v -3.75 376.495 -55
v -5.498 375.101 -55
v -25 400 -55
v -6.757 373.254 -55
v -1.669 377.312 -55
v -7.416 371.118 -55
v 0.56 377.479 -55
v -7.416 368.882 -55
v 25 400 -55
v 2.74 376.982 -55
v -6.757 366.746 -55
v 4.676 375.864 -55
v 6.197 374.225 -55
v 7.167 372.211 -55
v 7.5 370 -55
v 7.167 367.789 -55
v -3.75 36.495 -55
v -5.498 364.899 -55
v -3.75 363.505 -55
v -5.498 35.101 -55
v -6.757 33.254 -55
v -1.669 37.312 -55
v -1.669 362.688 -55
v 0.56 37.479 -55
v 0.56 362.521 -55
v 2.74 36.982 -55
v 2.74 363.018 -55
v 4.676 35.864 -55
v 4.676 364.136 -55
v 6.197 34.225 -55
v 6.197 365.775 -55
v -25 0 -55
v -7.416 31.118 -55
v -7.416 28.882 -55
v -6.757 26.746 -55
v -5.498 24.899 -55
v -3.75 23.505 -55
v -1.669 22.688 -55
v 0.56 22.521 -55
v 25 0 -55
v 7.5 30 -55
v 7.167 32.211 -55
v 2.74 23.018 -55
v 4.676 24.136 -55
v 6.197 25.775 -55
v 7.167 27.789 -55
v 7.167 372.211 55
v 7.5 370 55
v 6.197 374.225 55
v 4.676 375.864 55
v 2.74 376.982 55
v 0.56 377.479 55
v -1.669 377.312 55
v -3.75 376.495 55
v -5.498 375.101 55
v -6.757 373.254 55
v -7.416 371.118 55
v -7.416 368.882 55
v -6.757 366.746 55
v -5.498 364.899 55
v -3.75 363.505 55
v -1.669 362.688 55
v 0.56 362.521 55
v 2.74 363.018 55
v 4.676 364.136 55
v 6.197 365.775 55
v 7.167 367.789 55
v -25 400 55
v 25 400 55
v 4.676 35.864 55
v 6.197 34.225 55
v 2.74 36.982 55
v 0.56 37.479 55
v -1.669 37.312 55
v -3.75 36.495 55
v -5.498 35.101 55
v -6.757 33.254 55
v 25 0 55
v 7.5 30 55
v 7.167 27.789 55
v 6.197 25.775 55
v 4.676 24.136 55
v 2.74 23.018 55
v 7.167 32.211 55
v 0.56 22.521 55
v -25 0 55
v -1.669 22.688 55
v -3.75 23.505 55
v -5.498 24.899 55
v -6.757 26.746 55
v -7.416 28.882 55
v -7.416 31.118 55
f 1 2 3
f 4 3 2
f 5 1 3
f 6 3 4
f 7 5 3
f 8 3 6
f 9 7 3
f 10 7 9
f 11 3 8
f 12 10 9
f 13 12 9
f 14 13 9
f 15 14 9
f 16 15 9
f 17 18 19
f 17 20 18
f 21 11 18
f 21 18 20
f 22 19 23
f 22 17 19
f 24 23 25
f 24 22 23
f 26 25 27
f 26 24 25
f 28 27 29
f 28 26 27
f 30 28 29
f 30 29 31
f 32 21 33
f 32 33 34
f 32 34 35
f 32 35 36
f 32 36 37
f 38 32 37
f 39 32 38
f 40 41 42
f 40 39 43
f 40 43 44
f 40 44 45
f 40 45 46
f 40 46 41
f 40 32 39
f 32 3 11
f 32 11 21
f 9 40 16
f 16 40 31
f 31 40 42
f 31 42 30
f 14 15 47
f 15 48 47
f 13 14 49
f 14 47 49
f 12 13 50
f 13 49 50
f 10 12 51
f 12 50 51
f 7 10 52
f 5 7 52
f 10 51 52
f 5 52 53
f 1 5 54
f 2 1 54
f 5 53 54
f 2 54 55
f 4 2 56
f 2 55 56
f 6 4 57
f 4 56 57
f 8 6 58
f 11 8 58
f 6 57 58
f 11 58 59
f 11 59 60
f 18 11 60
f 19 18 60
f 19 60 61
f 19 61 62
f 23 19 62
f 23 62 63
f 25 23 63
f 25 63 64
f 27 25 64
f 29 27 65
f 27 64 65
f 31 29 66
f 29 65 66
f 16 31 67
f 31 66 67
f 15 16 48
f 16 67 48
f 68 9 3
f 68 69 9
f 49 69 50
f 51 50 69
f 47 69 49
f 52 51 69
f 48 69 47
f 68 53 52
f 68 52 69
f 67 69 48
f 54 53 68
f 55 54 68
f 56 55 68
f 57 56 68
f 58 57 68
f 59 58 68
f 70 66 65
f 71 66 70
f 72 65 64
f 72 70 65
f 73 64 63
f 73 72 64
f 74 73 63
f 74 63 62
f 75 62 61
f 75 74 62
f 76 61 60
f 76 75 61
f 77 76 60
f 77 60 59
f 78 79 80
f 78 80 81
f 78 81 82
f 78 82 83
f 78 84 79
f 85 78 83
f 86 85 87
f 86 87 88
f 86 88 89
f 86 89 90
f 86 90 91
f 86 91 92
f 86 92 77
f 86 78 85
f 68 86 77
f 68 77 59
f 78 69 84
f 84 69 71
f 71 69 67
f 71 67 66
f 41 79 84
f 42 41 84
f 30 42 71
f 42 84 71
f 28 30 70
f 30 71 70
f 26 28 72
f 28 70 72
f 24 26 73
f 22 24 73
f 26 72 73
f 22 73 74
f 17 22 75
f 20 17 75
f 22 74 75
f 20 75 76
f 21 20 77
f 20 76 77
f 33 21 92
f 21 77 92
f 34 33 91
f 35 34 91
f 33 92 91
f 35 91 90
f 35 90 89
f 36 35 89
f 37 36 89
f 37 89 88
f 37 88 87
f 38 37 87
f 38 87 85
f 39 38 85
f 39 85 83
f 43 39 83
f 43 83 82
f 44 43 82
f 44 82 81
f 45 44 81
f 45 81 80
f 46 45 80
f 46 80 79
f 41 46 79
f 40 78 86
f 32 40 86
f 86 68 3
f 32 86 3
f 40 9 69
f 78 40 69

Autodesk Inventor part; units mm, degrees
ref_plane "YZ Plane" through (0, 0, 0) normal (1, 0, 0) x (0, 1, 0)
ref_plane "XZ Plane" through (0, 0, 0) normal (0, 1, 0) x (-1, 0, 0)
ref_plane "XY Plane" through (0, 0, 0) normal (0, 0, 1) x (1, 0, 0)
sketch "Boceto1" plane through (0, 0, 0) normal (0, 1, 0) x (-1, 0, 0)
  line L0 (-25, 55) -> (25, 55)
  line L1 (25, 55) -> (25, -55)
  line L2 (25, -55) -> (-25, -55)
  line L3 (-25, -55) -> (-25, 55)
  line L4 (-25, 55) -> (25, -55) construction
  line L5 (25, 55) -> (-25, -55) construction
  point P0 (0, 0)
  dimension "d0" = 50
  dimension "d1" = 110
extrude "Extrusión1" add sketch "Boceto1" along normal blind 400
sketch "Boceto2" plane through (-25, 0, 55) normal (0, 0, 1) x (1, 0, 0)
  line L0 (0, 400) -> (50, 400) projected
  line L1 (25, 400) -> (25, 370)
  line L2 (25, 0) -> (25, 30)
  circle A0 centre (25, 370) radius 7.5
  circle A1 centre (25, 30) radius 7.5
  dimension "d4" = 30
  dimension "d5" = 30
  dimension "d6" = 15
  dimension "d7" = 15
extrude "Extrusión2" cut sketch "Boceto2" against normal up to next
properties part number "brazo2"
